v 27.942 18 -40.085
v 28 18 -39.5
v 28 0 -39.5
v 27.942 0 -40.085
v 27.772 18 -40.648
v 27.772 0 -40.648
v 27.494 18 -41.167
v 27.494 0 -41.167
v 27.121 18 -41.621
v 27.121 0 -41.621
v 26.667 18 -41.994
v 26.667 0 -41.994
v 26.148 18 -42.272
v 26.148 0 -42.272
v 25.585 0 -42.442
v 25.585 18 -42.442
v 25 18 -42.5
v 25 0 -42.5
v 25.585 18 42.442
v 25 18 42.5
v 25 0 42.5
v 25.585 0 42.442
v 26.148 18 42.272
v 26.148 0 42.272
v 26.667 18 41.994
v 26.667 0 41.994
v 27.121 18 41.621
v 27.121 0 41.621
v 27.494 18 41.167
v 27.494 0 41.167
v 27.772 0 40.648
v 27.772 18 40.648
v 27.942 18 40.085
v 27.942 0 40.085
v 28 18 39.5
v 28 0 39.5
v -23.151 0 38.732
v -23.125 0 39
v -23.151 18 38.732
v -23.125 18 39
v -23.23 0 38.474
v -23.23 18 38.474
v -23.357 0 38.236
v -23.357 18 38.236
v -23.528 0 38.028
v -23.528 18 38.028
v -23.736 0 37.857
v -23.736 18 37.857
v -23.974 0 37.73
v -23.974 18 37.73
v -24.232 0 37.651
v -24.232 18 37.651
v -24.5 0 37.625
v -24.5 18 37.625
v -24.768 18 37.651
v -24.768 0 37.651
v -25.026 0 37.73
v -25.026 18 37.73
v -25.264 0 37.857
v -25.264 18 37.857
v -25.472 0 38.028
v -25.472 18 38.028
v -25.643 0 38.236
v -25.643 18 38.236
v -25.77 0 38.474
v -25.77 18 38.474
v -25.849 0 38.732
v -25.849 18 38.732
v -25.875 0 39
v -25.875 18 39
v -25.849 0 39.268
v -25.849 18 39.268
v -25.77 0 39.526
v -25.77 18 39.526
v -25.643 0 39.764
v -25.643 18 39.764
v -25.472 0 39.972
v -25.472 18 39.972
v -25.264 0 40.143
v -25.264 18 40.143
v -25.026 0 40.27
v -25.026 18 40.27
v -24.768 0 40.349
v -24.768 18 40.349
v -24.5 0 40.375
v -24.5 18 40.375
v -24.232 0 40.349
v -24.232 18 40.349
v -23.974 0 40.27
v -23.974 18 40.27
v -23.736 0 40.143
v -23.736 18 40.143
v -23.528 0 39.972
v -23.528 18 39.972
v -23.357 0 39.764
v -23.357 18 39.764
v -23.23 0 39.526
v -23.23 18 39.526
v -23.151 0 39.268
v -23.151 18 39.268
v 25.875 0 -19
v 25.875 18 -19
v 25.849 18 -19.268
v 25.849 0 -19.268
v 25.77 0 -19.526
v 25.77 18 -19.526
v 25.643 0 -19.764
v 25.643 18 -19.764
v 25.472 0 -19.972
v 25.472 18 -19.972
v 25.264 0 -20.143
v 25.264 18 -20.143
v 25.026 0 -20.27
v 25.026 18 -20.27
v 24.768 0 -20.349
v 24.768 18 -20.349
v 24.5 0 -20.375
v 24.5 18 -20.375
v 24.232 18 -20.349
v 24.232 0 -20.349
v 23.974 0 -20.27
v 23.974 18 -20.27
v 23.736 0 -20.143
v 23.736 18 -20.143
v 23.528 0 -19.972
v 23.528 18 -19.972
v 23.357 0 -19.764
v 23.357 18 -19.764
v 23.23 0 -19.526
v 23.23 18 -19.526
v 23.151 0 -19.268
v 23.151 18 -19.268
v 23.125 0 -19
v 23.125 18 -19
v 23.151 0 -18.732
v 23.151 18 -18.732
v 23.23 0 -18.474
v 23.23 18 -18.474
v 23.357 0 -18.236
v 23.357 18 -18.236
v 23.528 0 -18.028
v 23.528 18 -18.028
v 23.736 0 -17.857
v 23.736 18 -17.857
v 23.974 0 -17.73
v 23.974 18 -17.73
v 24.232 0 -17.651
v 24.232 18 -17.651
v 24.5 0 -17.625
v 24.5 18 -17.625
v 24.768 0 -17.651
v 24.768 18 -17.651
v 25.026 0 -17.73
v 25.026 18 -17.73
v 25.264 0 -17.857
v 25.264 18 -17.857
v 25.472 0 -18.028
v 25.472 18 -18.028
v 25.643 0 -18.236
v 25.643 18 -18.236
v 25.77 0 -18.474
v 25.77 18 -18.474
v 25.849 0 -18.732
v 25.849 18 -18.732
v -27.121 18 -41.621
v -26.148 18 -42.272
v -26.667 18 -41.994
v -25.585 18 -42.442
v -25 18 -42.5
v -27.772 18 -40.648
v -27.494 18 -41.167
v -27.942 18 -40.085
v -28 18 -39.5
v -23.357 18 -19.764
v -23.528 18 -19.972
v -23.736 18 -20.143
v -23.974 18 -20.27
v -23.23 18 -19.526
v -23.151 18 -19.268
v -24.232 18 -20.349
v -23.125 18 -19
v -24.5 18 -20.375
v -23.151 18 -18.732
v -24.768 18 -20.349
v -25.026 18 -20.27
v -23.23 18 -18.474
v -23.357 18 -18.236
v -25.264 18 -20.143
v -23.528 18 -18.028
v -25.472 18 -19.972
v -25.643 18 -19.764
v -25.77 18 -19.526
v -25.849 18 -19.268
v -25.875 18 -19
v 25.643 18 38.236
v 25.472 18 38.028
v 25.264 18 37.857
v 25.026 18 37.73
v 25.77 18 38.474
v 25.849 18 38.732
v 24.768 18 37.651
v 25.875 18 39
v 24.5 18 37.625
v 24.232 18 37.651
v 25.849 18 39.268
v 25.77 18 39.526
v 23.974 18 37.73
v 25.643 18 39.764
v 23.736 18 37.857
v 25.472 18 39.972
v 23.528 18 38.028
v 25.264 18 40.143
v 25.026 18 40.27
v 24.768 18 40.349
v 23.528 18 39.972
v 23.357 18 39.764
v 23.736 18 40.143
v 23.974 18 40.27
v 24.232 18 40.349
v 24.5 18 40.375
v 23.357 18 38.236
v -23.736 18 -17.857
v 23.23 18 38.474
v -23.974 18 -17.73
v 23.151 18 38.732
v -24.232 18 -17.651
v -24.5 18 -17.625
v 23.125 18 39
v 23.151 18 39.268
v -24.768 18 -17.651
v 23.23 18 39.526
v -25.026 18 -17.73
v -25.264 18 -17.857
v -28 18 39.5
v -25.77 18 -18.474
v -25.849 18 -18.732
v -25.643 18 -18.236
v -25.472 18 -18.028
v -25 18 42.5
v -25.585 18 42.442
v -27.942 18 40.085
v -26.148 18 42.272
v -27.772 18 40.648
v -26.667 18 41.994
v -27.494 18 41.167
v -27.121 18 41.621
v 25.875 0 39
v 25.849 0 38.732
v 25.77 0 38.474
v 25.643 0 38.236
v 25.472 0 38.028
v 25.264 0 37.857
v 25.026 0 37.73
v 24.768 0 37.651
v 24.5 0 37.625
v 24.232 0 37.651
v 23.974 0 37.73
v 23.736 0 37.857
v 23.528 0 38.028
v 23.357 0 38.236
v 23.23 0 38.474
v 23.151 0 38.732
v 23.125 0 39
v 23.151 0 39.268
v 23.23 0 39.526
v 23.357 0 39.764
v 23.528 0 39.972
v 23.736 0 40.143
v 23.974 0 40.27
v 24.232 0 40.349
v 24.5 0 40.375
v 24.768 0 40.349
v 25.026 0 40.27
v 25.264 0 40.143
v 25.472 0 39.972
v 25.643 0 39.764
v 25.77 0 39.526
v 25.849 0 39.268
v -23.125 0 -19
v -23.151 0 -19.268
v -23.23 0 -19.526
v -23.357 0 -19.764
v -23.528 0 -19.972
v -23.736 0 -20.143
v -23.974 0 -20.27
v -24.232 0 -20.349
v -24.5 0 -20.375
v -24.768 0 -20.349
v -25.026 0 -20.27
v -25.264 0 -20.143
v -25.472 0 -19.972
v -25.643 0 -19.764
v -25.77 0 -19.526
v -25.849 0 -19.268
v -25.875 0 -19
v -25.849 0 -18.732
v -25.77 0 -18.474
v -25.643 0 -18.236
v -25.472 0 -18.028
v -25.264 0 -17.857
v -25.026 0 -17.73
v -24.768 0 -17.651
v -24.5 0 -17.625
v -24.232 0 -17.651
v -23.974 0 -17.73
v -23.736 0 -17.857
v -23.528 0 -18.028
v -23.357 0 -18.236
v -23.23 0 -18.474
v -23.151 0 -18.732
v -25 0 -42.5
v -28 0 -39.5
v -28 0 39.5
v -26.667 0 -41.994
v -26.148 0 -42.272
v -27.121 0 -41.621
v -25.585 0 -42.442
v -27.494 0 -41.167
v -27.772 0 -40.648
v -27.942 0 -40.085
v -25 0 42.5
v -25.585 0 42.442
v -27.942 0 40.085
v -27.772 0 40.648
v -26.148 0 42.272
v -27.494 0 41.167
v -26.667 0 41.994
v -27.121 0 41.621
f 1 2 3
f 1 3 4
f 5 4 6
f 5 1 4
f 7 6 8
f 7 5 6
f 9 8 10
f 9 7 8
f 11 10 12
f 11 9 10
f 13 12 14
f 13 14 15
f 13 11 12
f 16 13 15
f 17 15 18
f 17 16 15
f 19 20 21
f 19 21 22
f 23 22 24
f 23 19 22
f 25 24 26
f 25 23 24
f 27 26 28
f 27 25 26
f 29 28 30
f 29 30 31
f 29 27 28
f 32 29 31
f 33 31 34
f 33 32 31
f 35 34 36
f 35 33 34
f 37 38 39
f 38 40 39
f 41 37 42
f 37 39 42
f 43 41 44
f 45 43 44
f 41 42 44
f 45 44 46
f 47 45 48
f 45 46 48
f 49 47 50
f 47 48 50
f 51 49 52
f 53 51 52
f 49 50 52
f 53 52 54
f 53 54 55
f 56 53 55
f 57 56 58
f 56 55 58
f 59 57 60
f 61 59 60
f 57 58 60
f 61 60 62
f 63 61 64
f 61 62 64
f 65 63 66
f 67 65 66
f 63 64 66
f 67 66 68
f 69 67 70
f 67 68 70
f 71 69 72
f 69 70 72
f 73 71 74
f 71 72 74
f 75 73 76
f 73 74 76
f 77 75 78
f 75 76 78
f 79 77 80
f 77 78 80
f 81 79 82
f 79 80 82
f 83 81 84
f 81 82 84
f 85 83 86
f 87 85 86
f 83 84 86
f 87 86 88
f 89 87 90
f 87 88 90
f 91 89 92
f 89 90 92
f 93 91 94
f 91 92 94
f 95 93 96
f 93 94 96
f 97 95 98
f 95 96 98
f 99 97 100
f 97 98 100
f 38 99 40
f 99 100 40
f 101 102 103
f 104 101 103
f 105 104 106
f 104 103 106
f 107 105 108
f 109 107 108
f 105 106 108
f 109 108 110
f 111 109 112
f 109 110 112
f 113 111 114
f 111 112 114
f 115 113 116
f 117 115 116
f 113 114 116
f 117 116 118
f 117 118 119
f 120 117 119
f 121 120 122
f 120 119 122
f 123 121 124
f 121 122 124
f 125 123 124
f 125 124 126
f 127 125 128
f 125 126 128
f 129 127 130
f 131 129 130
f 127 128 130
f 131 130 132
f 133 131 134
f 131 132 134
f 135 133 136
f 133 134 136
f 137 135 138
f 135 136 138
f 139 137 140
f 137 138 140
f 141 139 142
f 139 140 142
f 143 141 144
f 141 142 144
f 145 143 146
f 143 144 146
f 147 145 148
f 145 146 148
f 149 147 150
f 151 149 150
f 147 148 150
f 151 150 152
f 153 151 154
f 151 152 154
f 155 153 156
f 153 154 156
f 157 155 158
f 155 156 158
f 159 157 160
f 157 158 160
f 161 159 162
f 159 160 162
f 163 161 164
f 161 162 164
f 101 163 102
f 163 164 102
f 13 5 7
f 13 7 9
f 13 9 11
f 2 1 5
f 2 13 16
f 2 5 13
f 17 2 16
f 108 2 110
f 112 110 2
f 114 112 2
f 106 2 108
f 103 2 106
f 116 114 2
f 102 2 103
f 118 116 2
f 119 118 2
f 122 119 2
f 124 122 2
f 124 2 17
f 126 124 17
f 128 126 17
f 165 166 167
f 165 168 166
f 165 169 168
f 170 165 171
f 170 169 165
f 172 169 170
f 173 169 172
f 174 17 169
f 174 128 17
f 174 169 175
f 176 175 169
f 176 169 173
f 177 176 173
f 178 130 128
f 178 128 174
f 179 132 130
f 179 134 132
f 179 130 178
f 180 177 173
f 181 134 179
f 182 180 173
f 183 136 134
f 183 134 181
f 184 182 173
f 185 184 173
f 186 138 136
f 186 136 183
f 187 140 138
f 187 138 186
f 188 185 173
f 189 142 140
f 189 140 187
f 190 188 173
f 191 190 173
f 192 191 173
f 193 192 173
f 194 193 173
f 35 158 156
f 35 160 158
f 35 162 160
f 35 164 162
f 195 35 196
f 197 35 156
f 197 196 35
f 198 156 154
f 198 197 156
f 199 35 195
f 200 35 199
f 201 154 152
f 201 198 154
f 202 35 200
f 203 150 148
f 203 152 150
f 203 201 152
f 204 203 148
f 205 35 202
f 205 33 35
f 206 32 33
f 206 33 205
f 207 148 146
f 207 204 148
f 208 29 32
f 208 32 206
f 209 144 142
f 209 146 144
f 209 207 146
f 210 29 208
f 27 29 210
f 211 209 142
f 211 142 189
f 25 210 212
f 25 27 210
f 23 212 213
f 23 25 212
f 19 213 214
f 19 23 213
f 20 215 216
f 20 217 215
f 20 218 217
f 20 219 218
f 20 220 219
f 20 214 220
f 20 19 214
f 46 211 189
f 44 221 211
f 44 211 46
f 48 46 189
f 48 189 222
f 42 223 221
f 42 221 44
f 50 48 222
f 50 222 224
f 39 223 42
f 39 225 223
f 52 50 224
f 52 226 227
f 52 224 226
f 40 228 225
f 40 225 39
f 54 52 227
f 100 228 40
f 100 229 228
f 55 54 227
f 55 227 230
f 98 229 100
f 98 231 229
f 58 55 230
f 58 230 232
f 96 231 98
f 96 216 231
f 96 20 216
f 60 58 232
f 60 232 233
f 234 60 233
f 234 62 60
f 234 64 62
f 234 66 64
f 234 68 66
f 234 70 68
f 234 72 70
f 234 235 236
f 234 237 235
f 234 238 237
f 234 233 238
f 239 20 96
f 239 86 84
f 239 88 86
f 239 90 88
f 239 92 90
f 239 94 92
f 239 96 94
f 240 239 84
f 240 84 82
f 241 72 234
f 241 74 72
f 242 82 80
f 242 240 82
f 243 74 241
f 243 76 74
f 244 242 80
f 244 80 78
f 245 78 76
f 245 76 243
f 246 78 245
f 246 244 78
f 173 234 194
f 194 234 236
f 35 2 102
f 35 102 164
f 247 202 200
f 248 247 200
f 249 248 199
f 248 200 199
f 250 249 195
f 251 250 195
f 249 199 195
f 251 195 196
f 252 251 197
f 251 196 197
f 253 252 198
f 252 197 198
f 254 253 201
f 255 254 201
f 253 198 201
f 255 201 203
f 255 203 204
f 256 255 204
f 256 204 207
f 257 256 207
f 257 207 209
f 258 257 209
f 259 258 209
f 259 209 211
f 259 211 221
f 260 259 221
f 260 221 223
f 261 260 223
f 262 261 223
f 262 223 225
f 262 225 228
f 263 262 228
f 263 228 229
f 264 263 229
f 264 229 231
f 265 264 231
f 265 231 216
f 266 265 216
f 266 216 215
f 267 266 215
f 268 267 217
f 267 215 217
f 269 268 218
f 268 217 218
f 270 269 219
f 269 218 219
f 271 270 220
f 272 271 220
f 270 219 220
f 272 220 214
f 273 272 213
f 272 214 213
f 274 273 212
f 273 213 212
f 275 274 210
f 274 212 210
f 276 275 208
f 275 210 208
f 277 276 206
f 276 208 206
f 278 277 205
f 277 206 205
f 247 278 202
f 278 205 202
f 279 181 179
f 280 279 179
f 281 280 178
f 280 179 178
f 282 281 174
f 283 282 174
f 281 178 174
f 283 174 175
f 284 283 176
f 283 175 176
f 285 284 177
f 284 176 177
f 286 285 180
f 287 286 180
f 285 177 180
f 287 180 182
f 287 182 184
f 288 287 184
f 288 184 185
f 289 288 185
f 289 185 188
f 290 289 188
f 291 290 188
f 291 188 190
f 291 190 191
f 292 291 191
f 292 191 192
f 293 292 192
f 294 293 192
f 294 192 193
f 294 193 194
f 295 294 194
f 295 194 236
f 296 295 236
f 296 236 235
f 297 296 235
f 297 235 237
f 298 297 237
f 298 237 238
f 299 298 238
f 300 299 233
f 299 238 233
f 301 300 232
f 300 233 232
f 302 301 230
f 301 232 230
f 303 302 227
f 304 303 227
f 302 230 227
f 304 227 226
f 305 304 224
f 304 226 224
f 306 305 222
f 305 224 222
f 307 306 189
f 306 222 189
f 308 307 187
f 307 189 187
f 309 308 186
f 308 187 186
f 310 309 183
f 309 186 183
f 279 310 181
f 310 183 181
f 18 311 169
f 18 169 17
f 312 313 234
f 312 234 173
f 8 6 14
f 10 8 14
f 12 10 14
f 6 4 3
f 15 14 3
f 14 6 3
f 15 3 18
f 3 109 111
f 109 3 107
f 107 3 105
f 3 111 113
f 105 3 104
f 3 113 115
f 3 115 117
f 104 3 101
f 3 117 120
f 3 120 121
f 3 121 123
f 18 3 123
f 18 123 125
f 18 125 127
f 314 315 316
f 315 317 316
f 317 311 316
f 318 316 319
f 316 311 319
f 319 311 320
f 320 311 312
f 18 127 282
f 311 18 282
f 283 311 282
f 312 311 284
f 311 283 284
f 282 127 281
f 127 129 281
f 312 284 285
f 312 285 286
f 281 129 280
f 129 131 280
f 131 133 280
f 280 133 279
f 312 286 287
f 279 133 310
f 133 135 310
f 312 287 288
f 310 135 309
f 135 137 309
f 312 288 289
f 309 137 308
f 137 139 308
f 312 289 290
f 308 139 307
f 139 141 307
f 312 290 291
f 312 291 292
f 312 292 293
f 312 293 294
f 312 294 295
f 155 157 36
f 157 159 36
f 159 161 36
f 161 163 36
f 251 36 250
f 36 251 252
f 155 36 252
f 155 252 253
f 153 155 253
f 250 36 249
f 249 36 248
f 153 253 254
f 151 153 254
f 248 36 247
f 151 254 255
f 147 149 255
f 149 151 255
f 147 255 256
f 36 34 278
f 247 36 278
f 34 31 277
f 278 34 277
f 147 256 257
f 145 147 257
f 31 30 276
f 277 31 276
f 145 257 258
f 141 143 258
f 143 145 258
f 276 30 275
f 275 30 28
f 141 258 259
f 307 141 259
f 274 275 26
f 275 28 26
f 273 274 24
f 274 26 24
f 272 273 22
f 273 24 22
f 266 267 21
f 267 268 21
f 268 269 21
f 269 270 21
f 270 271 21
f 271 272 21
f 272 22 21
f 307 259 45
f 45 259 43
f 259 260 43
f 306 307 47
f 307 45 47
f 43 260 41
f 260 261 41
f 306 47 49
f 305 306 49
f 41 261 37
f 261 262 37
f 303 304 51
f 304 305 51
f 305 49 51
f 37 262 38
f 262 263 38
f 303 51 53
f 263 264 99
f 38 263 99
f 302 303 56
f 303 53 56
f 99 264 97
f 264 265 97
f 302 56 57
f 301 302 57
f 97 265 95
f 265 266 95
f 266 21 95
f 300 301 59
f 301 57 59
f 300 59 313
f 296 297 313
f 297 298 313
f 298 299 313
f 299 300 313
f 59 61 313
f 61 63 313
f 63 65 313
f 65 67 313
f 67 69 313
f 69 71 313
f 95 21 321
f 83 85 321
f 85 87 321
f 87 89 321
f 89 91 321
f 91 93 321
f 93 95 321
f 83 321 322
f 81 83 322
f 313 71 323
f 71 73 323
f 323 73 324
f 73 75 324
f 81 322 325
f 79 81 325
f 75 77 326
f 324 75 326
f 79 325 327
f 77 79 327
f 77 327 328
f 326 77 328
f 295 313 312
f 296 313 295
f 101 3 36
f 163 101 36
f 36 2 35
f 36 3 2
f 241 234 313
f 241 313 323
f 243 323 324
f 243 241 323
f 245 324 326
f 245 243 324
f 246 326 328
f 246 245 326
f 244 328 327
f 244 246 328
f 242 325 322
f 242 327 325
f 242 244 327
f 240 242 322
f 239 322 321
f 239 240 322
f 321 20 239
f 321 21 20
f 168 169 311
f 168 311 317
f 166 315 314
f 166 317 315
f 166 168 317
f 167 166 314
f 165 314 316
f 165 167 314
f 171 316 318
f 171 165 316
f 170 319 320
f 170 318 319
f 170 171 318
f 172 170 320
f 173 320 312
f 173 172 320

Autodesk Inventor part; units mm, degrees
ref_plane "YZ Plane" through (0, 0, 0) normal (1, 0, 0) x (0, 1, 0)
ref_plane "XZ Plane" through (0, 0, 0) normal (0, 1, 0) x (-1, 0, 0)
ref_plane "XY Plane" through (0, 0, 0) normal (0, 0, 1) x (1, 0, 0)
sketch "Sketch1" plane through (0, 0, 0) normal (0, 1, 0) x (-1, 0, 0)
  line L0 (-28, 42.5) -> (28, 42.5)
  line L1 (28, 42.5) -> (28, -42.5)
  line L2 (28, -42.5) -> (-28, -42.5)
  line L3 (-28, -42.5) -> (-28, 42.5)
  point P0 (0, 0)
  point P1 (28, 0)
  point P2 (0, 42.5)
  dimension "d0" = 85
  dimension "d1" = 56
extrude "Extrusion1" add sketch "Sketch1" along normal blind 18
sketch "Sketch2" plane through (0, 18, 0) normal (0, 1, 0) x (1, 0, 0)
  circle A0 centre (-24.5, -39) radius 1.375
  circle A1 centre (24.5, -39) radius 1.375
  circle A2 centre (24.5, 19) radius 1.375
  circle A3 centre (-24.5, 19) radius 1.375
  line L0 (-28, 42.5) -> (-28, -42.5) projected
  line L1 (28, 42.5) -> (28, -42.5) projected
  line L2 (-28, -42.5) -> (28, -42.5) projected
  point P0 (0, 0)
  dimension "d4" = 3.5
  dimension "d5" = 3.5
  dimension "d6" = 58
  dimension "d7" = 2.75
  dimension "d8" = 3.5
extrude "Extrusion2" cut sketch "Sketch2" against normal through all
fillet "Fillet1" radius 3 4 edges at (28, 9, -42.5) (-28, 9, -42.5) (28, 9, 42.5) (-28, 9, 42.5)
equation "\"d0\" = Rpi_width"
equation "\"d1\" = Rpi_heigth"
equation "\"d4\" = Rpi_hole_distance_wall"
equation "\"d5\" = d4"
equation "\"d6\" = Rpi_hole_distance_between"
equation "\"d7\" = Rpi_hole_diameter"
equation "\"d8\" = d4"
equation "\"d11\" = Rpi_corner_radius"
equation "\"Rpi_hole_diameter\" = 2.75"
equation "\"Rpi_hole_distance_wall\" = 3.5"
equation "\"Rpi_hole_distance_between\" = 58"
equation "\"Rpi_width\" = 85"
equation "\"Rpi_heigth\" = 56"
equation "\"Rpi_corner_radius\" = 3"
properties part number "RaspberryPi_Placeholder"
